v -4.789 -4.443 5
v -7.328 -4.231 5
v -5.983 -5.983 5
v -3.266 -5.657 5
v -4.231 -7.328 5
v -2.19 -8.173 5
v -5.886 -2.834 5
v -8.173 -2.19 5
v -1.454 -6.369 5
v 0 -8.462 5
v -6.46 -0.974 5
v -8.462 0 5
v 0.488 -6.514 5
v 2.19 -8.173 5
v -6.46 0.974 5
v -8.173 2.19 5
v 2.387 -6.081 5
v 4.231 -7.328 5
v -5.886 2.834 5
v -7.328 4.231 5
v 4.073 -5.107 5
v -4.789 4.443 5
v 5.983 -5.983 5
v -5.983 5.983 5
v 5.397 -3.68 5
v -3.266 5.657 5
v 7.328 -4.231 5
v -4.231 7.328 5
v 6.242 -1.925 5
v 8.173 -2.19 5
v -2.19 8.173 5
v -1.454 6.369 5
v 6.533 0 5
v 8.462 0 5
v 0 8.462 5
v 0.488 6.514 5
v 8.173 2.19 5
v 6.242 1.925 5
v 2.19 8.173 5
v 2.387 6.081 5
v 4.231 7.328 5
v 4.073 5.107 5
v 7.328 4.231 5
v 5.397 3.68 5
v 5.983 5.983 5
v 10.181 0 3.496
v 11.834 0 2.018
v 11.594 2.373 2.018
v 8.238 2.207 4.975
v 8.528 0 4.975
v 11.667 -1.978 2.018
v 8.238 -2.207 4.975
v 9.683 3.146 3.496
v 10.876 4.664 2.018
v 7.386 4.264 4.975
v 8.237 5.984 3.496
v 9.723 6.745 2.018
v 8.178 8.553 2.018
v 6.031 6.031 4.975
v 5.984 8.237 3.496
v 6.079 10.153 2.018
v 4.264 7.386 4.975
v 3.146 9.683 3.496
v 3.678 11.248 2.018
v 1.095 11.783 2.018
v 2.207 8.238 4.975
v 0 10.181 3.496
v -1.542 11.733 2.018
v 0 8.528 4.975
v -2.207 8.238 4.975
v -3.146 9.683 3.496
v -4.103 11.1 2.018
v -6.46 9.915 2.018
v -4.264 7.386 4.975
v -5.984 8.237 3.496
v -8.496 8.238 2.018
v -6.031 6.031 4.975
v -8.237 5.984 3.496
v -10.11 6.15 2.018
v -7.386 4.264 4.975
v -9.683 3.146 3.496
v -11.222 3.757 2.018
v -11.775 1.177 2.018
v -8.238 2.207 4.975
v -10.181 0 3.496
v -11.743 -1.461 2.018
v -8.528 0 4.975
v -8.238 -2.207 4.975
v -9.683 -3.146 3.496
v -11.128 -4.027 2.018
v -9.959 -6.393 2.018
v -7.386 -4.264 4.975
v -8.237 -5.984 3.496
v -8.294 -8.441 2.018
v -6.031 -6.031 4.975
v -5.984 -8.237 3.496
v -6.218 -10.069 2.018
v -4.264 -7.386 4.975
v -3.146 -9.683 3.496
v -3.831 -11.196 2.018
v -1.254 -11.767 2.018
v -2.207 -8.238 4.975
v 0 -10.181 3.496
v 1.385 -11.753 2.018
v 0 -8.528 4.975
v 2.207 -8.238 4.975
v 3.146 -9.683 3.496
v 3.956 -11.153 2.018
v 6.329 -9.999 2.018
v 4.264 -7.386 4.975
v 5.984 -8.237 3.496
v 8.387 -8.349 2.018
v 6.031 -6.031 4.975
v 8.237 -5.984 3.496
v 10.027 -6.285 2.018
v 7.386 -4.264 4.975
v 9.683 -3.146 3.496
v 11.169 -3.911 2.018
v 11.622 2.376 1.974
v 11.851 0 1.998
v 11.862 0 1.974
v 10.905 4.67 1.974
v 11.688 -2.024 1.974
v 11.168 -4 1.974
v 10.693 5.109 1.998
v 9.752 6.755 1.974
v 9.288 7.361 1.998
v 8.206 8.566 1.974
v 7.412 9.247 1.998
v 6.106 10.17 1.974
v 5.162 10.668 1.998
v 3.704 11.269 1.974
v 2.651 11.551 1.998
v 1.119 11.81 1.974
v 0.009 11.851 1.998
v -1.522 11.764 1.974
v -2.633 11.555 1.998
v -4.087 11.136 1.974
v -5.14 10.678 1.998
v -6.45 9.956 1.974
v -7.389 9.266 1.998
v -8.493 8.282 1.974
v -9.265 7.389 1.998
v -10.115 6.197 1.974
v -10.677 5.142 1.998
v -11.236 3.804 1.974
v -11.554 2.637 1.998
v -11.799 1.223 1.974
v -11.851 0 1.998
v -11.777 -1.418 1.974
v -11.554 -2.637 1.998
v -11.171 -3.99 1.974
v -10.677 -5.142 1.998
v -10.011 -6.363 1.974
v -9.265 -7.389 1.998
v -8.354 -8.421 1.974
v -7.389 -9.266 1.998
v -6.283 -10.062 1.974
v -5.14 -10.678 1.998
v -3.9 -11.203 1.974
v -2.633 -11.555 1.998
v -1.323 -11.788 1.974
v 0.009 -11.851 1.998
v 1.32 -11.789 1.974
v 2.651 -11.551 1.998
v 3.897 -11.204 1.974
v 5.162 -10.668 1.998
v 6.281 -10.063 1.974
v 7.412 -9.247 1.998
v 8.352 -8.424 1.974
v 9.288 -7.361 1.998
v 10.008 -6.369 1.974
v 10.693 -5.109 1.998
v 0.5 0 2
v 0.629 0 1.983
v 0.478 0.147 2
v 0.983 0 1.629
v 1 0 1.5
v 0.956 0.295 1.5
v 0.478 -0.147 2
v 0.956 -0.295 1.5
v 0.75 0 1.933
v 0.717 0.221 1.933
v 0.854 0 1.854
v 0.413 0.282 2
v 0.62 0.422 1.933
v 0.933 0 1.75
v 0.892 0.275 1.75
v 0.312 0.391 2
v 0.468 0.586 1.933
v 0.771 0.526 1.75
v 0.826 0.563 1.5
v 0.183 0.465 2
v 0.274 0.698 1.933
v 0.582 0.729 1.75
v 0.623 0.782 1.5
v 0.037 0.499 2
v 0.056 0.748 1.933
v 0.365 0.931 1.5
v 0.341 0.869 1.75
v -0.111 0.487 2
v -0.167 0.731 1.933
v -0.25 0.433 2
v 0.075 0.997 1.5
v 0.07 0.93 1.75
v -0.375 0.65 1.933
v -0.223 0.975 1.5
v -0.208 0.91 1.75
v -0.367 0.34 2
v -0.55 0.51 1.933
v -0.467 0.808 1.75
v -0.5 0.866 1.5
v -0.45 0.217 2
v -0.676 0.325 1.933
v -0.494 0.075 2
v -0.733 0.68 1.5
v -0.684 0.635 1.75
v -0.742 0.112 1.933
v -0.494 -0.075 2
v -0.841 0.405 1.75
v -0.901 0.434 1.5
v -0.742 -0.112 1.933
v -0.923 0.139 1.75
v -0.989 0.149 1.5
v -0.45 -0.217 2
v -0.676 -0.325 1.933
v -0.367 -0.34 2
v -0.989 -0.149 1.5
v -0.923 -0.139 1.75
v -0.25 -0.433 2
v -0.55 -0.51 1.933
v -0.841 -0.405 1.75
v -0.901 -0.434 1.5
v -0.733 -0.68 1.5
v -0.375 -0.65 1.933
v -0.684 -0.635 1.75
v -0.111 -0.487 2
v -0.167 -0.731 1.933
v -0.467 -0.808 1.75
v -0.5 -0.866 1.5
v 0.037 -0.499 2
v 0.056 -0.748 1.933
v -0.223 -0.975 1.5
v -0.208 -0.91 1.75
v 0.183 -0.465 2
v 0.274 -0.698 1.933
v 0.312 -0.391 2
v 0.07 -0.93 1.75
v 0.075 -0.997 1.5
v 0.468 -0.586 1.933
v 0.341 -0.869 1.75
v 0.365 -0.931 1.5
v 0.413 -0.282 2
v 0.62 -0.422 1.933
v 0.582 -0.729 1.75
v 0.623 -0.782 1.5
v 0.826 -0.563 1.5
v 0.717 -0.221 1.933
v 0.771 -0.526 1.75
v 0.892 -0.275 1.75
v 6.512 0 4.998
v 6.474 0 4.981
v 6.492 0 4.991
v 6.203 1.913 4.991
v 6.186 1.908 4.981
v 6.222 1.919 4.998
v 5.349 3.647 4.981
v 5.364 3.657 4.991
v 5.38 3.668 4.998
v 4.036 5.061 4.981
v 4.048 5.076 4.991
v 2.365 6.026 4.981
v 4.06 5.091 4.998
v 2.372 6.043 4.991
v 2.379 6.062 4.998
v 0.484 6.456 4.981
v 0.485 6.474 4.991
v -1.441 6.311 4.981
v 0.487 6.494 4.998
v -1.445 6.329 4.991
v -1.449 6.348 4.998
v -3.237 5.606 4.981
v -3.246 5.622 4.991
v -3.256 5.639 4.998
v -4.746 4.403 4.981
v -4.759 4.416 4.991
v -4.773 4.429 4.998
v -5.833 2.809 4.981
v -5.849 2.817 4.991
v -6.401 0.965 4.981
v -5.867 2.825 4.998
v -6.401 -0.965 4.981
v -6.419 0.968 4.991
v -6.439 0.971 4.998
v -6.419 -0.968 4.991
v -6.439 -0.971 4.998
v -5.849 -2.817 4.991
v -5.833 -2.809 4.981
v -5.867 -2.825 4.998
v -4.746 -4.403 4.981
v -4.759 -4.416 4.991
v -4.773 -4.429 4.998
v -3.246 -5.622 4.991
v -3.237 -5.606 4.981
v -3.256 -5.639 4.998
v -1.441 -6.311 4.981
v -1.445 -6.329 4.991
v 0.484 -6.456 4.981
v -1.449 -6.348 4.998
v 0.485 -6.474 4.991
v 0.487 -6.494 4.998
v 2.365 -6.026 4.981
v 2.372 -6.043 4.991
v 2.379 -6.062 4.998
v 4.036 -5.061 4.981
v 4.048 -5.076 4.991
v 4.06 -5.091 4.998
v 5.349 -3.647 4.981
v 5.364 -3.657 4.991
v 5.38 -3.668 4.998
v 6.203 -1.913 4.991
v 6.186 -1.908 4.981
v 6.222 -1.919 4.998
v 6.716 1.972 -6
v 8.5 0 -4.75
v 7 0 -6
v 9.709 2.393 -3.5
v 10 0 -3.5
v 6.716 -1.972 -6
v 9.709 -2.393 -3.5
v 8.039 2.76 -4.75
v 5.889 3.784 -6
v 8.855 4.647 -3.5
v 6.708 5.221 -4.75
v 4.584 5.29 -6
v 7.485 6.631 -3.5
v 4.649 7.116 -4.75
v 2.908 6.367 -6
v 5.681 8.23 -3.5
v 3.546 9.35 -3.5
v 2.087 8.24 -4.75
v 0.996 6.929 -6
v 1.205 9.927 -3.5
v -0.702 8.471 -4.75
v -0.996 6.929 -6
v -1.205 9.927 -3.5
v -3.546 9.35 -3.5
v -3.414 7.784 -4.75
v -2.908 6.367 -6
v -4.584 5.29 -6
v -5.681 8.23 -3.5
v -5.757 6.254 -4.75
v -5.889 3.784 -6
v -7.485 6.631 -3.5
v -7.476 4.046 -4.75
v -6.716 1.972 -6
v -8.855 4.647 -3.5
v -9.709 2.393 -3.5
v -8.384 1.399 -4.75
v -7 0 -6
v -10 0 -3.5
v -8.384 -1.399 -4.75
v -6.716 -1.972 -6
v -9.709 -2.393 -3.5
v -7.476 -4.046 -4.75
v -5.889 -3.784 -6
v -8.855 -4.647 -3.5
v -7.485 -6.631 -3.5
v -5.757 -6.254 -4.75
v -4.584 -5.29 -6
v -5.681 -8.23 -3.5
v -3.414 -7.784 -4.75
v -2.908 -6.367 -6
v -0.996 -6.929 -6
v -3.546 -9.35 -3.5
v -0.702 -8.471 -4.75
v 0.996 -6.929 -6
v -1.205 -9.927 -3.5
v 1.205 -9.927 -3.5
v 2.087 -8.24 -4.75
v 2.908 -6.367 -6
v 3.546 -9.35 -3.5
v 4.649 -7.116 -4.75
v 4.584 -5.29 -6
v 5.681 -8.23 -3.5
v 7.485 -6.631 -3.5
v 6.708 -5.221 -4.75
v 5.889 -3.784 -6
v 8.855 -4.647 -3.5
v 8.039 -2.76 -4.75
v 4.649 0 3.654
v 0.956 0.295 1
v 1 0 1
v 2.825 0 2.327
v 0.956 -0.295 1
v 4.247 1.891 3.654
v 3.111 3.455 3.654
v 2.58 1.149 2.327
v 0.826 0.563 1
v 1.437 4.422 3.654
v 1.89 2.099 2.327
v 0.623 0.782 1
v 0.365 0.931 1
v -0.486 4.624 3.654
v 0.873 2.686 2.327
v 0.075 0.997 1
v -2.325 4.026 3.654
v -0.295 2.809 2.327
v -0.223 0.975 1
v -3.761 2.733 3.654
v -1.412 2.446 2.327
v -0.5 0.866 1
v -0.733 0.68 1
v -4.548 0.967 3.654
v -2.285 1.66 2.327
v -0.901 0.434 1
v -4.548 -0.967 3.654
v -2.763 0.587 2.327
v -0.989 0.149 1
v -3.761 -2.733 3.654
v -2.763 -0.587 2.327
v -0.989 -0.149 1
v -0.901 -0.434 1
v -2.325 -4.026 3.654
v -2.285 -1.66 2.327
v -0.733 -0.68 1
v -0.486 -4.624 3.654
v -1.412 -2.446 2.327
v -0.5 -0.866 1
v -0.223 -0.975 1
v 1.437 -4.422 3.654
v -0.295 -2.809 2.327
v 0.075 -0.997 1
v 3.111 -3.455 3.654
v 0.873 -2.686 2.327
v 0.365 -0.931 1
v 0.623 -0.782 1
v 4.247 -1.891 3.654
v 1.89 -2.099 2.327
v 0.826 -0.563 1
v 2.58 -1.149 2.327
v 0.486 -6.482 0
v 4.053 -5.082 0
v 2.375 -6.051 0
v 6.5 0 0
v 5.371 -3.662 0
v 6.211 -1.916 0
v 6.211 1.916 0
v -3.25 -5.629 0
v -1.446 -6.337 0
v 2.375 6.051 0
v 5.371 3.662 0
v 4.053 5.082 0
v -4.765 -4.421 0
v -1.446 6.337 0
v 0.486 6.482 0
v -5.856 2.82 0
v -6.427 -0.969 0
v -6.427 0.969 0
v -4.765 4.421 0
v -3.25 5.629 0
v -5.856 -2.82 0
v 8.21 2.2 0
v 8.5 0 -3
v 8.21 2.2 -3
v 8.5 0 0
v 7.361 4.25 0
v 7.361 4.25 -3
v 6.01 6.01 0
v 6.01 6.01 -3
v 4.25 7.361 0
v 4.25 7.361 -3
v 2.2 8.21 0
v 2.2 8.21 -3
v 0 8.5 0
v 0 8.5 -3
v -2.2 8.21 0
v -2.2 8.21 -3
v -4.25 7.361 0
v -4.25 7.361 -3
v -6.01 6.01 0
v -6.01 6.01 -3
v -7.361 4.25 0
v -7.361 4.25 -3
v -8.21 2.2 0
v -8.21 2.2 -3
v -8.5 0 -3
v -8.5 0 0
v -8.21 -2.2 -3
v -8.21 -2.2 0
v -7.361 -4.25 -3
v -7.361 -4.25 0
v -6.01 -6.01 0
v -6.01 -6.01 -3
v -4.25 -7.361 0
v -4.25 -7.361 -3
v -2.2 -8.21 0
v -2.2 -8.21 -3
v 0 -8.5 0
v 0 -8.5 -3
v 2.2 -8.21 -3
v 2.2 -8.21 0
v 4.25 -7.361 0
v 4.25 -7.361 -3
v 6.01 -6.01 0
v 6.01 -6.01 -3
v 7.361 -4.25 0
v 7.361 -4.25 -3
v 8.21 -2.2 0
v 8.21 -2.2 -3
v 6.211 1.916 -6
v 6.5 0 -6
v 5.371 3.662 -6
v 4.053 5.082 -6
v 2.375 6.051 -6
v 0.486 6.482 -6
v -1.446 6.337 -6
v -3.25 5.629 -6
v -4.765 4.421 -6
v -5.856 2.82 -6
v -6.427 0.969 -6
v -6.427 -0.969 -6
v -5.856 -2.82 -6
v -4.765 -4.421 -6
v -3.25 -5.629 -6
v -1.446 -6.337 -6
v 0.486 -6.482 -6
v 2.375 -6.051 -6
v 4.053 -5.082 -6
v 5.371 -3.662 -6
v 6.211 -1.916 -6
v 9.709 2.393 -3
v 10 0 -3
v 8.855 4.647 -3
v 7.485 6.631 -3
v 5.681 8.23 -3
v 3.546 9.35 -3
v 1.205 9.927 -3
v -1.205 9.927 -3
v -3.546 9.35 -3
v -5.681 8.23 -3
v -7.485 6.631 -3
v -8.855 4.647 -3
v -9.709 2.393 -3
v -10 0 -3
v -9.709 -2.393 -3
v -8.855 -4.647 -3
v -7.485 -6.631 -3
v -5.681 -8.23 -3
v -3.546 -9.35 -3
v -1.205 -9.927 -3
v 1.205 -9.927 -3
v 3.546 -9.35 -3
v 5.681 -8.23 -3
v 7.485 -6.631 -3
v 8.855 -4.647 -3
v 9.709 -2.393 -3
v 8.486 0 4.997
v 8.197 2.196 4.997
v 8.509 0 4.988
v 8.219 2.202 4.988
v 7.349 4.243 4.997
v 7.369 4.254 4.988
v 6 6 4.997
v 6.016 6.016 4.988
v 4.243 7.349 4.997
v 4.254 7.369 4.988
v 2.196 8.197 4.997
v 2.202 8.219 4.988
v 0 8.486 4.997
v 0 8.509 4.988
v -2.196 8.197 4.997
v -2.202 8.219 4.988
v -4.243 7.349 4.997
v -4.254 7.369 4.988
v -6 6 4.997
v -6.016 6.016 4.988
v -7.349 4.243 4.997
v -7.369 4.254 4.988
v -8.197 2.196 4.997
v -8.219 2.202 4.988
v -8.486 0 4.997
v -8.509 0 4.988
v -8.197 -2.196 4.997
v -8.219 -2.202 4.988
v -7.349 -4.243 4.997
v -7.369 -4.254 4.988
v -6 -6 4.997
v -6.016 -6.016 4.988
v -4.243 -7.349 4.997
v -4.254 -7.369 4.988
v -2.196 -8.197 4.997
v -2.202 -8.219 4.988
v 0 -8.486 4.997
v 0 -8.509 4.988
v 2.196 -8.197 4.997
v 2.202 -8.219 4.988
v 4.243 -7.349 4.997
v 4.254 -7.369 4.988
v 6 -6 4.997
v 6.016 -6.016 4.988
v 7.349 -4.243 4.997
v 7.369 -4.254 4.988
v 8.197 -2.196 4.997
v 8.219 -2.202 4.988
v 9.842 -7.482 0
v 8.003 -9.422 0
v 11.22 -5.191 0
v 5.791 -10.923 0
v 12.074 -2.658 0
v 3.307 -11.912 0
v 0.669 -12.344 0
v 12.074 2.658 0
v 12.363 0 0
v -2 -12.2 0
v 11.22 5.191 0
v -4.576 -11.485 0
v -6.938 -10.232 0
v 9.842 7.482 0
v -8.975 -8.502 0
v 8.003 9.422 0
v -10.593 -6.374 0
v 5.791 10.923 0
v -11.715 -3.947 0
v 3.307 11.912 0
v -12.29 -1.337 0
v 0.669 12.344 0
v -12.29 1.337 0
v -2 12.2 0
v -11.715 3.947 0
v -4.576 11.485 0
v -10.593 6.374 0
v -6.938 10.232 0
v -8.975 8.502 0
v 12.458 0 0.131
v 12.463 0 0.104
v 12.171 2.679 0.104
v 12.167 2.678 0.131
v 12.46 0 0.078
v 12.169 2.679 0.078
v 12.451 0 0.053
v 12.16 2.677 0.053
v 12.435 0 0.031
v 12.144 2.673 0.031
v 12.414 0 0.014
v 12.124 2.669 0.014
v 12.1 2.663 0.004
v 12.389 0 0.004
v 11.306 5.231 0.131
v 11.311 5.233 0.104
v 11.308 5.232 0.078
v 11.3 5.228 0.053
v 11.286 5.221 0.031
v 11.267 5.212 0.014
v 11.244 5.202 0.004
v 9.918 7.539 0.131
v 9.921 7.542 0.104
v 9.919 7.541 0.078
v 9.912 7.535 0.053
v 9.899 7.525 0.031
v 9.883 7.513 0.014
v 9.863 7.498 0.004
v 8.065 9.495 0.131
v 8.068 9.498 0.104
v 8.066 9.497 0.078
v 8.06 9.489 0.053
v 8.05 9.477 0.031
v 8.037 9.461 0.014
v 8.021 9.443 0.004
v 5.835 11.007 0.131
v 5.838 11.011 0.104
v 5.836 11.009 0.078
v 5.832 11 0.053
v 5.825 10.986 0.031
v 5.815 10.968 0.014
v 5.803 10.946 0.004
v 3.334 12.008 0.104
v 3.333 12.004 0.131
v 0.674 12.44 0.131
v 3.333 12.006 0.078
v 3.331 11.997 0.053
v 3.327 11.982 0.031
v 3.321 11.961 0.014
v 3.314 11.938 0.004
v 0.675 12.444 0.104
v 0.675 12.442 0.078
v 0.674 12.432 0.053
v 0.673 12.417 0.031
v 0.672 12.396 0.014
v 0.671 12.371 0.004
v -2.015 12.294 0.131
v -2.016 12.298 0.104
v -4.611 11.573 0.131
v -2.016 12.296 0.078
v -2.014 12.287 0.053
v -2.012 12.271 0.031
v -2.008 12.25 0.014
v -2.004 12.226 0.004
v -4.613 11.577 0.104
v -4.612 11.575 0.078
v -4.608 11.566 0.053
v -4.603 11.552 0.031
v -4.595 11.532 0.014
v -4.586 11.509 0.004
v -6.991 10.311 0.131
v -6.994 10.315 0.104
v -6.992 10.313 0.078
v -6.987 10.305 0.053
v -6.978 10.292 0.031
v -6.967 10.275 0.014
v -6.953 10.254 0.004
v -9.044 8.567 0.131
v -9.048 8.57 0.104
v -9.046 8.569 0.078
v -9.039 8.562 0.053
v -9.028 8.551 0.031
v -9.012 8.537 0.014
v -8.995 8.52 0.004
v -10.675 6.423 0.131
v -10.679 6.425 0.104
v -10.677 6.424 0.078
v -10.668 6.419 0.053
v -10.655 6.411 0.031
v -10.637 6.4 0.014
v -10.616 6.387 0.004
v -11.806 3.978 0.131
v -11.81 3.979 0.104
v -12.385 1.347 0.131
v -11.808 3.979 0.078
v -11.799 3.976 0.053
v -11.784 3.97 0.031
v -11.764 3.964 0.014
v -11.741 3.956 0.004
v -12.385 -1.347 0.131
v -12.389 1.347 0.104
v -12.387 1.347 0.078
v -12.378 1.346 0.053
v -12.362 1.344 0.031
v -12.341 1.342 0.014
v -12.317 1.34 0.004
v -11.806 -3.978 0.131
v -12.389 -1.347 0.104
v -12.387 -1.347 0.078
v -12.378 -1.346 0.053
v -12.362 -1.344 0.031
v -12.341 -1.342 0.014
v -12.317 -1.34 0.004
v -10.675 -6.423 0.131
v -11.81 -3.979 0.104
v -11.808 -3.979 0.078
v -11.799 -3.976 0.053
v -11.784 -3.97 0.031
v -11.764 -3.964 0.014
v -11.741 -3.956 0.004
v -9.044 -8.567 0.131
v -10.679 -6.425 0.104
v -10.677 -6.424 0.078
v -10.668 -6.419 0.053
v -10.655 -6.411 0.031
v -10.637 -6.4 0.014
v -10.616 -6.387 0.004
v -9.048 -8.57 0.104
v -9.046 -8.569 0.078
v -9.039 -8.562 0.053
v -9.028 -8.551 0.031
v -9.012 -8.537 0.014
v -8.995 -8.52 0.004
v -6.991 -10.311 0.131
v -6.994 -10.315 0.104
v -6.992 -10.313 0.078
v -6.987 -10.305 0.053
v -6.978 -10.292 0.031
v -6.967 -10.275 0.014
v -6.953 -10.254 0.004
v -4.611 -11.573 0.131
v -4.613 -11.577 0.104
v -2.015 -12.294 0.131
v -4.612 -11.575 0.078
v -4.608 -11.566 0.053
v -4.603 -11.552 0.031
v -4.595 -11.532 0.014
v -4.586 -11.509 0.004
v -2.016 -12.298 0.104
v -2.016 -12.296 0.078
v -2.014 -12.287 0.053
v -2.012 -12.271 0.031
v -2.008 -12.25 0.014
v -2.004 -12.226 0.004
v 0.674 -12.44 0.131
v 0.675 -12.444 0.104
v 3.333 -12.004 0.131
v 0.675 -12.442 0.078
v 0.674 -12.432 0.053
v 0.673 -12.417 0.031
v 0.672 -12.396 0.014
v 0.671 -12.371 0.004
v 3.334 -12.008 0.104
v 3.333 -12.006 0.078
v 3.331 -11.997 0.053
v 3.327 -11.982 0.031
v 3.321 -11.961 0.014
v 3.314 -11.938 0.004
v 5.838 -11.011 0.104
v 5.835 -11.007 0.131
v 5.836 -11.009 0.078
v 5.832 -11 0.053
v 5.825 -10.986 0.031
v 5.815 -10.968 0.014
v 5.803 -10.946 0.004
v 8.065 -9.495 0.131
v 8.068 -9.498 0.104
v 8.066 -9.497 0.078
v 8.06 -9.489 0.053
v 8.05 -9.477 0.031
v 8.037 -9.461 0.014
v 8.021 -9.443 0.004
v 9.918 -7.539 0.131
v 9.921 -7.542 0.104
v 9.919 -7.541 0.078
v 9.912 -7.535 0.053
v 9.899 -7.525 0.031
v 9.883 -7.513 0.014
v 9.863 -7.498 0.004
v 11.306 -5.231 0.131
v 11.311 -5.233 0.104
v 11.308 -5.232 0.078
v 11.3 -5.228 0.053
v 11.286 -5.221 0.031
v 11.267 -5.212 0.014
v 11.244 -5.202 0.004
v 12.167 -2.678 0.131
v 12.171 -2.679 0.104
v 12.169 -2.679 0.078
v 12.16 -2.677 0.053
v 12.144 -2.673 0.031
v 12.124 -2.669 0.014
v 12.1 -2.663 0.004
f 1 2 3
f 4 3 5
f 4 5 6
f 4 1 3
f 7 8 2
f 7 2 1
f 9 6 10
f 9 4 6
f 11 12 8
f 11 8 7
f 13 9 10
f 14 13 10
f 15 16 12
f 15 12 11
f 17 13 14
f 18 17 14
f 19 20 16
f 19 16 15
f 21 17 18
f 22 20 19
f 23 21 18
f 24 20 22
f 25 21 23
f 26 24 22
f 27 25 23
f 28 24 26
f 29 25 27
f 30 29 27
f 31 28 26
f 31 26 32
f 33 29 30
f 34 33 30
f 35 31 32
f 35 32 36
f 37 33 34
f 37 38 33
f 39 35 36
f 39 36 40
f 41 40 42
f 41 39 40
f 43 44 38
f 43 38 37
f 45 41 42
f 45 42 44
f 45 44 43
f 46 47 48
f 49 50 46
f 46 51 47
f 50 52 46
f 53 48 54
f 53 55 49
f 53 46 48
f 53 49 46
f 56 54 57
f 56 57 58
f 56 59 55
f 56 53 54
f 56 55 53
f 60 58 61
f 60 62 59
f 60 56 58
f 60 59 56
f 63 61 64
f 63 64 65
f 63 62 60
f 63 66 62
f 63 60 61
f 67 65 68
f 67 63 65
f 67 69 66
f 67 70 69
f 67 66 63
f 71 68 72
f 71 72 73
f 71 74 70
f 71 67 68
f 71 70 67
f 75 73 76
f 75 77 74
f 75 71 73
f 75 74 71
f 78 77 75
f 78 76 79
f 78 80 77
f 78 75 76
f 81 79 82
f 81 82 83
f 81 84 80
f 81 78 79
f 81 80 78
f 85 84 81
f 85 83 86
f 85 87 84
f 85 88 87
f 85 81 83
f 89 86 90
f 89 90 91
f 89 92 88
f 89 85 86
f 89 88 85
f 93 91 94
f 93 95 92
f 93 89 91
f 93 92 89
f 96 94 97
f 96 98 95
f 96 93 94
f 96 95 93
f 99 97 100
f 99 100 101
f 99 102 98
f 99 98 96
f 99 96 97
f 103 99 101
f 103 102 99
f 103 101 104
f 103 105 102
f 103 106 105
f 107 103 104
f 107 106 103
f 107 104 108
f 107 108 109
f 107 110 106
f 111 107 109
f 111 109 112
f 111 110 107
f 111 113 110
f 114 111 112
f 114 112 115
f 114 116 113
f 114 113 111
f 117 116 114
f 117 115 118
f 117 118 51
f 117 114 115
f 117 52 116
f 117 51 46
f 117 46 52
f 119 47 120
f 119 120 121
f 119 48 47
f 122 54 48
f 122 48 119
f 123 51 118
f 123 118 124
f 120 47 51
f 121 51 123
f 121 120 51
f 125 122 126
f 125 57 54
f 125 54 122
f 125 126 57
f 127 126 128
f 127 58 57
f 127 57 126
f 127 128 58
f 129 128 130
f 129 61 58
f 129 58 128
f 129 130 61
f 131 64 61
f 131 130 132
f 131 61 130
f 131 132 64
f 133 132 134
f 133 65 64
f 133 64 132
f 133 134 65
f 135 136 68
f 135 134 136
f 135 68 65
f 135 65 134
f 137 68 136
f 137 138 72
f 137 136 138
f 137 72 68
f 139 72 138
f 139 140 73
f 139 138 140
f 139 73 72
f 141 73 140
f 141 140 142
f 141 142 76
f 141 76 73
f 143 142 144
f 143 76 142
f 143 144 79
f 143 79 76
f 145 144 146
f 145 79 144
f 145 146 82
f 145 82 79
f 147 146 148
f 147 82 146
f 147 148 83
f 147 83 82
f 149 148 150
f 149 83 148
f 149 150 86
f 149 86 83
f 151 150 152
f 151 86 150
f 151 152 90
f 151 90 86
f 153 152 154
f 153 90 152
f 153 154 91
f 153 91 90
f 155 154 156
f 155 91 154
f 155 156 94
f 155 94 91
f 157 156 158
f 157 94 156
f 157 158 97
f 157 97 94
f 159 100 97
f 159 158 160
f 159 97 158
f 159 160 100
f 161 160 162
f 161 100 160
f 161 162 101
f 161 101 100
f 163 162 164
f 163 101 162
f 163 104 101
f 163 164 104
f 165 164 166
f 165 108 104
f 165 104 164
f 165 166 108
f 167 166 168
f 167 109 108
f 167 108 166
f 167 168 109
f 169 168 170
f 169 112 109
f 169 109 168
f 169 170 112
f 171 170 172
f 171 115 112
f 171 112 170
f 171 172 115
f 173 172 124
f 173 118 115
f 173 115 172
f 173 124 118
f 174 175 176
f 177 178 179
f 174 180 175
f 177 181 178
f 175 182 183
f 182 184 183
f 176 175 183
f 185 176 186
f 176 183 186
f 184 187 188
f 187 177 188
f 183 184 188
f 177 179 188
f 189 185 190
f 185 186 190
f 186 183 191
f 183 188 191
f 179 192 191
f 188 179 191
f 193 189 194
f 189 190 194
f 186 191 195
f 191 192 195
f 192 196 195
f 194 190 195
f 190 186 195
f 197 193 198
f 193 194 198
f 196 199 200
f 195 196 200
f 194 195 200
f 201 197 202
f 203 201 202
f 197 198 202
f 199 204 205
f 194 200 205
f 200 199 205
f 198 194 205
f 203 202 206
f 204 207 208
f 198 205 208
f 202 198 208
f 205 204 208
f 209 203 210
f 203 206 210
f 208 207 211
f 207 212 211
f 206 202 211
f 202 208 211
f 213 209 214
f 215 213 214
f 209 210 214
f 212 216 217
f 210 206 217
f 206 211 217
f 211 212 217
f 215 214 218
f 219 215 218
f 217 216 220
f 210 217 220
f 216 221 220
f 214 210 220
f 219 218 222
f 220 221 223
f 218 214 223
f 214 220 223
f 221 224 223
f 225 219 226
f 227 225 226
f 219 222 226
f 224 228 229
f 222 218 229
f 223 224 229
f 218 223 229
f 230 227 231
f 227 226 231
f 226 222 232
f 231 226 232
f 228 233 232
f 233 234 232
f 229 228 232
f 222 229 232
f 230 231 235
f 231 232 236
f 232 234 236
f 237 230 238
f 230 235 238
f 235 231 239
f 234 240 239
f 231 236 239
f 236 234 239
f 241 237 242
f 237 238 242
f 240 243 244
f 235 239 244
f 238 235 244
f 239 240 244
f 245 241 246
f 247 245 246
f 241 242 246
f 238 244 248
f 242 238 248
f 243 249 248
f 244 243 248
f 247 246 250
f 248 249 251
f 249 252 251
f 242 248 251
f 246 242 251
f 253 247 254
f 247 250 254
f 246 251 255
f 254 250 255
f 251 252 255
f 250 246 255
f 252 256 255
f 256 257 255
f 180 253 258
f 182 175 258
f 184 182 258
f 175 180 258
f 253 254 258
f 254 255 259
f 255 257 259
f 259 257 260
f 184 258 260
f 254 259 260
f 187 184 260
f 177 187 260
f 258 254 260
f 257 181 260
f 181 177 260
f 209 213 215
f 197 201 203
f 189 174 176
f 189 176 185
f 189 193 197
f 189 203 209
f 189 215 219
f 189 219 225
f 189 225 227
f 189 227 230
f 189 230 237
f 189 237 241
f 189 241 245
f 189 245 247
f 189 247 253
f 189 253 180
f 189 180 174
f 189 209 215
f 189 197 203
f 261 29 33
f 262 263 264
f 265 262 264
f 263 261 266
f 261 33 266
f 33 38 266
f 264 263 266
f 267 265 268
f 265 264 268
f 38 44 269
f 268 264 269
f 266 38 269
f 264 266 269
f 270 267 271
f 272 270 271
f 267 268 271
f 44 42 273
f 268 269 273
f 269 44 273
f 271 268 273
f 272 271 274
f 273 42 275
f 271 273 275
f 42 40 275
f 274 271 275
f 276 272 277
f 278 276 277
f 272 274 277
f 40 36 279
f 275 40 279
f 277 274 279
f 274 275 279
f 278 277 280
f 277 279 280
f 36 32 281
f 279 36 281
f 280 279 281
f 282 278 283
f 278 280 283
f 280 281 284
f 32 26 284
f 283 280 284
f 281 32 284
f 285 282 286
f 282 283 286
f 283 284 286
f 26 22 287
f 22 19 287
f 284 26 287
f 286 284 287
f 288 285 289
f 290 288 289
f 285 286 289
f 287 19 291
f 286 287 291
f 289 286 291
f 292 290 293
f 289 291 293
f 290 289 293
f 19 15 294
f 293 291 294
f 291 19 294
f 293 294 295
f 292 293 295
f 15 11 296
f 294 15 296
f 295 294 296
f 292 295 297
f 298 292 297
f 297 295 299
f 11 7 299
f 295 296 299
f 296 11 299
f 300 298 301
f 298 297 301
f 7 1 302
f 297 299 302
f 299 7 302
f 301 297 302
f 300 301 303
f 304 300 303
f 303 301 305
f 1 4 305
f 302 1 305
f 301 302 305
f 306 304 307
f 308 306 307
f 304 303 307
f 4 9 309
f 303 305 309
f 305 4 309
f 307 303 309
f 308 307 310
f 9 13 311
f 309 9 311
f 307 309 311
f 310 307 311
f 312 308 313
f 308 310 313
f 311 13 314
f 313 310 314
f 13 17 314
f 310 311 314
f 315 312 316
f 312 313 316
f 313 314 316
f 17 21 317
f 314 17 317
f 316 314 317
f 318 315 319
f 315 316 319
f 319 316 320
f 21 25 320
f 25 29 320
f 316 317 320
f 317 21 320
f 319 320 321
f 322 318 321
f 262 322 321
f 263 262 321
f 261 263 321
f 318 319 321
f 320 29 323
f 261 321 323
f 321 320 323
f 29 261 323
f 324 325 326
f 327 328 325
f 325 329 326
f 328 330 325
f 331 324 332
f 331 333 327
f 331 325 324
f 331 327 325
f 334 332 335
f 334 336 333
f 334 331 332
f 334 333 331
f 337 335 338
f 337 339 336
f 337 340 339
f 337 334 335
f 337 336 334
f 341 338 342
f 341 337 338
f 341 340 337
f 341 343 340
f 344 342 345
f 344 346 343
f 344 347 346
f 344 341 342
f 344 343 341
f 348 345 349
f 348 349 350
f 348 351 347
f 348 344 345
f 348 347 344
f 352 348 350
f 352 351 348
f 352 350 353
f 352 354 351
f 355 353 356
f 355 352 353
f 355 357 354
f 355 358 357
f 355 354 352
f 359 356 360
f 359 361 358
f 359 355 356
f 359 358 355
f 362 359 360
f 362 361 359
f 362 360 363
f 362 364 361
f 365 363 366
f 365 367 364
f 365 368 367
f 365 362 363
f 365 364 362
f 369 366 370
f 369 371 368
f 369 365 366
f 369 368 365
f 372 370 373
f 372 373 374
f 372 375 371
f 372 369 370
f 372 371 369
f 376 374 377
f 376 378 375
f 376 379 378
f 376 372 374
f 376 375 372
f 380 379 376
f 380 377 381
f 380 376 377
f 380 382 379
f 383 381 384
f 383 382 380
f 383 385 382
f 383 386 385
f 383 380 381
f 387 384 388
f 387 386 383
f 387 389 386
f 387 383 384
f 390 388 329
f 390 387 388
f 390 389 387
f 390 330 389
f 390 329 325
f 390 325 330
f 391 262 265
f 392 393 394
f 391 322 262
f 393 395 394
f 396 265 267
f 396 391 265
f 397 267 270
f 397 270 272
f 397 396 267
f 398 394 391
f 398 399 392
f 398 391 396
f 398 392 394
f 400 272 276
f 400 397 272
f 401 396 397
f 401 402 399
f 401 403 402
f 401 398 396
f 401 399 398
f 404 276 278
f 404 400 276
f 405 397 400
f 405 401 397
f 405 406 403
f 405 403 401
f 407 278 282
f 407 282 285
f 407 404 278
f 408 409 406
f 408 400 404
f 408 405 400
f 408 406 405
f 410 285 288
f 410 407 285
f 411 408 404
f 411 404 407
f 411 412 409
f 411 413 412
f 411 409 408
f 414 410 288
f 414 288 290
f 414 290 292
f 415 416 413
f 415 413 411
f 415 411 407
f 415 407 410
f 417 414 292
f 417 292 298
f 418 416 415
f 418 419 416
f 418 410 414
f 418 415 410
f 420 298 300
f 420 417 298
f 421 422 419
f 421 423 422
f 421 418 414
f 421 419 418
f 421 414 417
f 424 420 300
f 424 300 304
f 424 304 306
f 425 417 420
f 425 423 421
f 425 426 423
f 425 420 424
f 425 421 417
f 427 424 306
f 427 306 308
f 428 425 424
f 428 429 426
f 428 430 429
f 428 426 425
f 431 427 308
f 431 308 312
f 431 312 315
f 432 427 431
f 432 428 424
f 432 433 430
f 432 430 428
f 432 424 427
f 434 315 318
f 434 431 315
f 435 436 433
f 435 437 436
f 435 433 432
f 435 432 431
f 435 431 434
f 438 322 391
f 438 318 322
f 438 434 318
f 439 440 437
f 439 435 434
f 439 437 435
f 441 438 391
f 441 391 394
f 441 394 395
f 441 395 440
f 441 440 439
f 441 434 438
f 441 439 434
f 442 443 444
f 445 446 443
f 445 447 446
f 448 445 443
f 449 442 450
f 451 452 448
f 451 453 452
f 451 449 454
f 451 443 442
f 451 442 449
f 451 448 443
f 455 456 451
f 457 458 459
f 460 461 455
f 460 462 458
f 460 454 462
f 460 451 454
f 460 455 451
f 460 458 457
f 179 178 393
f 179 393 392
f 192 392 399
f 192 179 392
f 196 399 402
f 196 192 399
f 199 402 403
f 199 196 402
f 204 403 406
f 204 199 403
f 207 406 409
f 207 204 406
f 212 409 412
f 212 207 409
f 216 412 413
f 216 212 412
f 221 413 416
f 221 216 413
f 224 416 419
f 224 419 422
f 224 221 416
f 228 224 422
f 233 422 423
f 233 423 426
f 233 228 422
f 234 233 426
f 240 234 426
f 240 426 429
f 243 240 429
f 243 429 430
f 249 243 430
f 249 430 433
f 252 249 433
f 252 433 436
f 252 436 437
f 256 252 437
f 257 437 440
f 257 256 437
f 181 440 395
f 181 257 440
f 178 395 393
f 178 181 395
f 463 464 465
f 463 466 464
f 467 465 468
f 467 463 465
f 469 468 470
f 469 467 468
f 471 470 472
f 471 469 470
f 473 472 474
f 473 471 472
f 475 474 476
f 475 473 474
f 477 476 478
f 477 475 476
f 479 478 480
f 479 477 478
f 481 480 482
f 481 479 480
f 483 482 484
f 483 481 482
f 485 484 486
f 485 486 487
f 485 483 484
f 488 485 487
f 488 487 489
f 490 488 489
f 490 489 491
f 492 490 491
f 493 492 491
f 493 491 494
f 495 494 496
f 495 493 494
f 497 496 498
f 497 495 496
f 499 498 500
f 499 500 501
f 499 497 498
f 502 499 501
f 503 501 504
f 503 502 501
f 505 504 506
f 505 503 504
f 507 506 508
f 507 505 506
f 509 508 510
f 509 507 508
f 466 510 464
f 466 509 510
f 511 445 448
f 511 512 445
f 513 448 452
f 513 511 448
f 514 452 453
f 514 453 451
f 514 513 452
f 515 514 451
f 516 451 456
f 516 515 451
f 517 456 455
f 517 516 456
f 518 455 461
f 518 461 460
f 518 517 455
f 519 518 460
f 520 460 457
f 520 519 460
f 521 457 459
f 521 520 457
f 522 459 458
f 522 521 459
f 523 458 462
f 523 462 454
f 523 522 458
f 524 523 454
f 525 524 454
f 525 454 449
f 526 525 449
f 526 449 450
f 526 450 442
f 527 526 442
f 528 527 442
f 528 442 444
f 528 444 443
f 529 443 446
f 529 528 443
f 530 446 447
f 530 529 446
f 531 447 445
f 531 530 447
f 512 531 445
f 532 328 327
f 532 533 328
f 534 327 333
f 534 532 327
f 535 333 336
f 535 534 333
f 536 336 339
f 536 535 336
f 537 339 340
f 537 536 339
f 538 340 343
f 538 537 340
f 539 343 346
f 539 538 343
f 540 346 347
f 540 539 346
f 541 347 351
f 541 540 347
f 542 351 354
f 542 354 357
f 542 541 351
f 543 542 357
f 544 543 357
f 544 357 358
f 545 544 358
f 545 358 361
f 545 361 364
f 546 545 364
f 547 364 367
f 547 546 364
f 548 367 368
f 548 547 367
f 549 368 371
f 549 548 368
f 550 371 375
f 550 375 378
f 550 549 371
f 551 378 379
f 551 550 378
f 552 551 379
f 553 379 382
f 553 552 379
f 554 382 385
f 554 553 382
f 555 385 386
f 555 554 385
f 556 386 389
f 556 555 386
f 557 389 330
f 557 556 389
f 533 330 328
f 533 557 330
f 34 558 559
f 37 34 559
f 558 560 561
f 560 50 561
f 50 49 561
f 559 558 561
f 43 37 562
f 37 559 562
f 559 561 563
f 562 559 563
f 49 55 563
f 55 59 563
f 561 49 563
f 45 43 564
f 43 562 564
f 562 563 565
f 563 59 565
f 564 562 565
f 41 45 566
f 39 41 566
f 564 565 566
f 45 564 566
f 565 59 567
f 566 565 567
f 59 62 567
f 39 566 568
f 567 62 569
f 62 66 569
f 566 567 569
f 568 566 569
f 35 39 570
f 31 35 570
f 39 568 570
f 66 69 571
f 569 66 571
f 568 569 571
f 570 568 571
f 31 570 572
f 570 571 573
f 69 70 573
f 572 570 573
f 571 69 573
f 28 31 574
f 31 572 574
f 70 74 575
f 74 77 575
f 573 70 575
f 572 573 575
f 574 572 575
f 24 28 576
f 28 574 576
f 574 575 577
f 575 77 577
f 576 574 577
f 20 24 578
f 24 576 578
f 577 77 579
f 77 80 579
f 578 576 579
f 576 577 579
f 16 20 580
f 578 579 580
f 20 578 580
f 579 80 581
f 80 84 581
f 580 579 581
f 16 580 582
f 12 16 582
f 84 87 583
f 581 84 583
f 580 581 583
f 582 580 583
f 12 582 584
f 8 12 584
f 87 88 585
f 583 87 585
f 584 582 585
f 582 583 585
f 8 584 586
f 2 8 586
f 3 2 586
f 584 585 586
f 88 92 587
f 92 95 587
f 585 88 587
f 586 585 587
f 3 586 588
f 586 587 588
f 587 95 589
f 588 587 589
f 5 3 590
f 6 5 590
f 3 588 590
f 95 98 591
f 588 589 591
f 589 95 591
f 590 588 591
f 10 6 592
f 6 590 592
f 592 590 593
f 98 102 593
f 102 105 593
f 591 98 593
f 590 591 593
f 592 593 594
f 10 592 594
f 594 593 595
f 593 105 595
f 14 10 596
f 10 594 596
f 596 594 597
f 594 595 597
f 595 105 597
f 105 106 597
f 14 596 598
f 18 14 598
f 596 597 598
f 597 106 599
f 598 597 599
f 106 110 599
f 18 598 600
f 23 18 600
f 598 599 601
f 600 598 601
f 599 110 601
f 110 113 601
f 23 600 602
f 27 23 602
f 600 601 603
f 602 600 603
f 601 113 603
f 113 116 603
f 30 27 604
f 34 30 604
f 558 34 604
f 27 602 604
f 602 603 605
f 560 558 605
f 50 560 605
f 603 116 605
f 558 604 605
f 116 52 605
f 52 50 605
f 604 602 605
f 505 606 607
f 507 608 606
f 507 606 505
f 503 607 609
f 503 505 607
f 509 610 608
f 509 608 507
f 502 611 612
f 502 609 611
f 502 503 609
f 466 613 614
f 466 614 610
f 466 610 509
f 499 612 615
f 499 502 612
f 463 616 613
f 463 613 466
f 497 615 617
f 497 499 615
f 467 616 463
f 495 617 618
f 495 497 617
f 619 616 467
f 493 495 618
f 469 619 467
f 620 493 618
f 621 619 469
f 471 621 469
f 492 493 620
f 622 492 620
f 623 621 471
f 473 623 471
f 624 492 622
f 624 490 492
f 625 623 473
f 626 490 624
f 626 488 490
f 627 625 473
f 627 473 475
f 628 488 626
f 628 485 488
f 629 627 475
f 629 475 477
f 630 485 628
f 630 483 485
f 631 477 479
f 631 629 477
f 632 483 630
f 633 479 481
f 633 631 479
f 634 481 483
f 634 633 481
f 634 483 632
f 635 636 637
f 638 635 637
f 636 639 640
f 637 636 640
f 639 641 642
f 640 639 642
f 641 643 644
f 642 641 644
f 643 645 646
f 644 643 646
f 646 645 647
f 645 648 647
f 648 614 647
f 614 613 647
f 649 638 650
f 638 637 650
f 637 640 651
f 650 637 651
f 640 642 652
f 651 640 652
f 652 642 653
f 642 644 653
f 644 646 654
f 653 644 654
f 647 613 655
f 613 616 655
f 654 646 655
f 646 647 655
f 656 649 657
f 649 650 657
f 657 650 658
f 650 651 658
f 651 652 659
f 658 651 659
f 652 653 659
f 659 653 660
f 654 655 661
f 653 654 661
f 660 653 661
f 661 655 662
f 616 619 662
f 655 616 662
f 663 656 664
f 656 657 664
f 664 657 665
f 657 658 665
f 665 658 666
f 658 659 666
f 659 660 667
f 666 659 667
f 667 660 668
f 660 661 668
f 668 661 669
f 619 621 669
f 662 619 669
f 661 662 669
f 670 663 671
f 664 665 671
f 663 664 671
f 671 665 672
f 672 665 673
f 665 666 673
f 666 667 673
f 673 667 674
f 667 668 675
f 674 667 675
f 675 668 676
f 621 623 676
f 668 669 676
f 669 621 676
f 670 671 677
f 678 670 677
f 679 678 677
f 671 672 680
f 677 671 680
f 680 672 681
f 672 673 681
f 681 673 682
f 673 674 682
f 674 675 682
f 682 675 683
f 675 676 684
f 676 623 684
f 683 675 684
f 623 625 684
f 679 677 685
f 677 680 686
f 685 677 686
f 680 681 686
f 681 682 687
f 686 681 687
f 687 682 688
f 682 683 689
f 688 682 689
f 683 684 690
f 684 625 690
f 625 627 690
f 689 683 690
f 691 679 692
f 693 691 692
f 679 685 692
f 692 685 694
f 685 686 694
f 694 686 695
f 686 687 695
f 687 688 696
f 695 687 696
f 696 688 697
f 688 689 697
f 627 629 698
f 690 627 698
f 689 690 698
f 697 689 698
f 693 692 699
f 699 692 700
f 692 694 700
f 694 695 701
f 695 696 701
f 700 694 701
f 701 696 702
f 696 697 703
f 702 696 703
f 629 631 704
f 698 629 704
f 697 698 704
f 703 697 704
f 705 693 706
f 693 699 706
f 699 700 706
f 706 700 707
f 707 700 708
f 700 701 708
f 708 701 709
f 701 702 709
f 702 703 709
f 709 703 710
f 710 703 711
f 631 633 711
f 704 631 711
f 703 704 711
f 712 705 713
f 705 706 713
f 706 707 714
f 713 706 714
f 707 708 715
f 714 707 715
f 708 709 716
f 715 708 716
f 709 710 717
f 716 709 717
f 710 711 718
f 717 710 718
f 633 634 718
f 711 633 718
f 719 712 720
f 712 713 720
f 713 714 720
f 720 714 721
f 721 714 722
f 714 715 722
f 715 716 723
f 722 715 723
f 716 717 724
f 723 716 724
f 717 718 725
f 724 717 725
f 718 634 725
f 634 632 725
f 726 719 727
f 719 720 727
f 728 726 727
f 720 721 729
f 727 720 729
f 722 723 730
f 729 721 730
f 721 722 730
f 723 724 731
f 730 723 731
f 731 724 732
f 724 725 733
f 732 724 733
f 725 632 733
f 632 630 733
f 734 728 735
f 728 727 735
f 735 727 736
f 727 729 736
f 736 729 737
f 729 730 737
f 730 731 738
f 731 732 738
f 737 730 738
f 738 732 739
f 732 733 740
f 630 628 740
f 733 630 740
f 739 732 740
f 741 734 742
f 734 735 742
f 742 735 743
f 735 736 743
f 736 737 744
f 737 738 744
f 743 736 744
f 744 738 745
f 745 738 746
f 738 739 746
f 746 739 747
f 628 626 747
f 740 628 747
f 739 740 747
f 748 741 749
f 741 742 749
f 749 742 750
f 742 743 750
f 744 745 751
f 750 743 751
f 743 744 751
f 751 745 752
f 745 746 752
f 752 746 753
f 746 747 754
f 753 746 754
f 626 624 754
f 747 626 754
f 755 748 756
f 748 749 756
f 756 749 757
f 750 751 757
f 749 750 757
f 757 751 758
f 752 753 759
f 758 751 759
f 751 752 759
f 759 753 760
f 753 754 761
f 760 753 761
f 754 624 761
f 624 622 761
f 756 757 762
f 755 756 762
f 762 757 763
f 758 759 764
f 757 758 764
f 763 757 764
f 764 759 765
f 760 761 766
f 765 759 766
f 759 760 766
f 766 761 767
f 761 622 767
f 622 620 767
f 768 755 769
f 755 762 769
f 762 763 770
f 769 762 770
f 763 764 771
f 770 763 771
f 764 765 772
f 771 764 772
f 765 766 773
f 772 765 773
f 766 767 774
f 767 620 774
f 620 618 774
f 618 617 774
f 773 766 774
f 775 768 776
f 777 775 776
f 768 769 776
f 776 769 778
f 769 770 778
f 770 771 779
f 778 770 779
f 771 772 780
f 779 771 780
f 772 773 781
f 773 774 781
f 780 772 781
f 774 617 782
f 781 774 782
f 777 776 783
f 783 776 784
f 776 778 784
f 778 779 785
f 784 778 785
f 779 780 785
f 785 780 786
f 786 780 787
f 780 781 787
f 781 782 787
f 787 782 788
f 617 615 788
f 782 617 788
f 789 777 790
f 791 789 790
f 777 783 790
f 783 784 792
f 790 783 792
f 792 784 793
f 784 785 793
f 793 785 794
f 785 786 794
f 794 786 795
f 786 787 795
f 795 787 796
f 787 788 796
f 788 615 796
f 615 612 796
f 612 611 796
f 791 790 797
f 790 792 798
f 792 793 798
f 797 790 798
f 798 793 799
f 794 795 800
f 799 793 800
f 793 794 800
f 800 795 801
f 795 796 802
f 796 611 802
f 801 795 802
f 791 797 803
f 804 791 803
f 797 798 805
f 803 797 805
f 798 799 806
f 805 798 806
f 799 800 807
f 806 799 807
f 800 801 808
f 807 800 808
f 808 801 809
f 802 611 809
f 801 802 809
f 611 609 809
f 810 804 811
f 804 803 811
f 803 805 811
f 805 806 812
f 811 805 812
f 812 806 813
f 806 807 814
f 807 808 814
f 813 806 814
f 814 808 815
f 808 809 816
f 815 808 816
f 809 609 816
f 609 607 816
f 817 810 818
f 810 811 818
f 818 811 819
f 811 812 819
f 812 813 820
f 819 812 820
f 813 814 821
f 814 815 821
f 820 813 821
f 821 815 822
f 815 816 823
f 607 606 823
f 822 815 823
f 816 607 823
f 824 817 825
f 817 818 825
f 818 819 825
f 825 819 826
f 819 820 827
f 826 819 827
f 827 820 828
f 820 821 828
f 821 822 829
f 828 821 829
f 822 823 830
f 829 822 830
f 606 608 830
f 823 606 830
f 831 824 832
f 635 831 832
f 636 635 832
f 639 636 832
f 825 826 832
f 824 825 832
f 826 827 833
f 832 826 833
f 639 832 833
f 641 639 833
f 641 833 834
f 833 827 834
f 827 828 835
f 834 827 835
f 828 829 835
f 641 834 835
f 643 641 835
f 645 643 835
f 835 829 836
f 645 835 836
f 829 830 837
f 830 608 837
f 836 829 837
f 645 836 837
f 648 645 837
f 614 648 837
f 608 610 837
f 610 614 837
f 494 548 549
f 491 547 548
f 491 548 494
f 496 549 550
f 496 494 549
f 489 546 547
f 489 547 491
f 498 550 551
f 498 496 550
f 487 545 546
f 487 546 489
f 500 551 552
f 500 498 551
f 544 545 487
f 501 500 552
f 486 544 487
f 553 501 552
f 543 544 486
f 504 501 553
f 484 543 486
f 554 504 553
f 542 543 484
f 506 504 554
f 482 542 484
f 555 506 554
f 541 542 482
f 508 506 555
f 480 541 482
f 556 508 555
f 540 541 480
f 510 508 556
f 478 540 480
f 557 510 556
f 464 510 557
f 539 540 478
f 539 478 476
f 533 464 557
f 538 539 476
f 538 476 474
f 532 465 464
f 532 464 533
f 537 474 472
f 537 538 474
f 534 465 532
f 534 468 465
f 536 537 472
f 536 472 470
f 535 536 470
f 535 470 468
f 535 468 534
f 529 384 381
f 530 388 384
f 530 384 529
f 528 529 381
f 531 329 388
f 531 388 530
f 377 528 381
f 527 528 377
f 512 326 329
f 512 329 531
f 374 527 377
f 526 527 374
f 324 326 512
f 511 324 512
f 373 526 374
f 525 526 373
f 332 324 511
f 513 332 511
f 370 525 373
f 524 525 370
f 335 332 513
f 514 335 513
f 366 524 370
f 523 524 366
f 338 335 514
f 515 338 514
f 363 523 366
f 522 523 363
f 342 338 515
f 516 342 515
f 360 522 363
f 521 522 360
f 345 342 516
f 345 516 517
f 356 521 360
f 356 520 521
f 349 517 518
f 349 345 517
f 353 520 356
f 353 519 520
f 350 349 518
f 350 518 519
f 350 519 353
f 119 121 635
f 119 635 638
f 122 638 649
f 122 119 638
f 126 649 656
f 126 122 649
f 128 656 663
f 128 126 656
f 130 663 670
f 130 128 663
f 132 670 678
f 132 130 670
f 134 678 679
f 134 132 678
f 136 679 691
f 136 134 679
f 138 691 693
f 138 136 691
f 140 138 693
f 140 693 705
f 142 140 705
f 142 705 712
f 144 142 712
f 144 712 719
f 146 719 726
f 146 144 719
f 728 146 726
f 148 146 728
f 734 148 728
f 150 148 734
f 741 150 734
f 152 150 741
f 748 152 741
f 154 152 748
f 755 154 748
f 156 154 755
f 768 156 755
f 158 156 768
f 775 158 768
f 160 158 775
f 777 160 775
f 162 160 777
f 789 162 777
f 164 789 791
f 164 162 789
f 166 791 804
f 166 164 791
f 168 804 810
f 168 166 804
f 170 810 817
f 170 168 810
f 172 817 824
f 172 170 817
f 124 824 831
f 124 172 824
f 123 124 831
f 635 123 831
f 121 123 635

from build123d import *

# Parameters (mm, degrees)
F2_R = 0.5
F3_R = 0.1


with BuildPart() as f1:
    # F0 (on Front) → F1 (revolve)
    with BuildSketch(Plane.XZ):
        Polygon((1, 2), (0, 2), (0, 0), (6.5, 0), (6.5, -6), (7, -6), (10, -3.5), (10, -3), (8.5, -3), (8.5, 0), (12.5, 0), (11.854102, 2), (8.5, 5), (6.5, 5), (1, 1), align=None)
    revolve(axis=Axis((0, 0, 1), (0, 0, 1)))

    # F2
    f2_edges = [f1.edges().sort_by_distance(p)[0] for p in [
        (-1, 0, 2),
    ]]
    fillet(f2_edges, radius=F2_R)

    # F3
    f3_edges = [f1.edges().sort_by_distance(p)[0] for p in [
        (-6.5, 0, 5),
        (-8.5, 0, 5),
        (-11.854102, 0, 2),
        (-12.5, 0, 0),
    ]]
    fillet(f3_edges, radius=F3_R)


solid = f1.part
